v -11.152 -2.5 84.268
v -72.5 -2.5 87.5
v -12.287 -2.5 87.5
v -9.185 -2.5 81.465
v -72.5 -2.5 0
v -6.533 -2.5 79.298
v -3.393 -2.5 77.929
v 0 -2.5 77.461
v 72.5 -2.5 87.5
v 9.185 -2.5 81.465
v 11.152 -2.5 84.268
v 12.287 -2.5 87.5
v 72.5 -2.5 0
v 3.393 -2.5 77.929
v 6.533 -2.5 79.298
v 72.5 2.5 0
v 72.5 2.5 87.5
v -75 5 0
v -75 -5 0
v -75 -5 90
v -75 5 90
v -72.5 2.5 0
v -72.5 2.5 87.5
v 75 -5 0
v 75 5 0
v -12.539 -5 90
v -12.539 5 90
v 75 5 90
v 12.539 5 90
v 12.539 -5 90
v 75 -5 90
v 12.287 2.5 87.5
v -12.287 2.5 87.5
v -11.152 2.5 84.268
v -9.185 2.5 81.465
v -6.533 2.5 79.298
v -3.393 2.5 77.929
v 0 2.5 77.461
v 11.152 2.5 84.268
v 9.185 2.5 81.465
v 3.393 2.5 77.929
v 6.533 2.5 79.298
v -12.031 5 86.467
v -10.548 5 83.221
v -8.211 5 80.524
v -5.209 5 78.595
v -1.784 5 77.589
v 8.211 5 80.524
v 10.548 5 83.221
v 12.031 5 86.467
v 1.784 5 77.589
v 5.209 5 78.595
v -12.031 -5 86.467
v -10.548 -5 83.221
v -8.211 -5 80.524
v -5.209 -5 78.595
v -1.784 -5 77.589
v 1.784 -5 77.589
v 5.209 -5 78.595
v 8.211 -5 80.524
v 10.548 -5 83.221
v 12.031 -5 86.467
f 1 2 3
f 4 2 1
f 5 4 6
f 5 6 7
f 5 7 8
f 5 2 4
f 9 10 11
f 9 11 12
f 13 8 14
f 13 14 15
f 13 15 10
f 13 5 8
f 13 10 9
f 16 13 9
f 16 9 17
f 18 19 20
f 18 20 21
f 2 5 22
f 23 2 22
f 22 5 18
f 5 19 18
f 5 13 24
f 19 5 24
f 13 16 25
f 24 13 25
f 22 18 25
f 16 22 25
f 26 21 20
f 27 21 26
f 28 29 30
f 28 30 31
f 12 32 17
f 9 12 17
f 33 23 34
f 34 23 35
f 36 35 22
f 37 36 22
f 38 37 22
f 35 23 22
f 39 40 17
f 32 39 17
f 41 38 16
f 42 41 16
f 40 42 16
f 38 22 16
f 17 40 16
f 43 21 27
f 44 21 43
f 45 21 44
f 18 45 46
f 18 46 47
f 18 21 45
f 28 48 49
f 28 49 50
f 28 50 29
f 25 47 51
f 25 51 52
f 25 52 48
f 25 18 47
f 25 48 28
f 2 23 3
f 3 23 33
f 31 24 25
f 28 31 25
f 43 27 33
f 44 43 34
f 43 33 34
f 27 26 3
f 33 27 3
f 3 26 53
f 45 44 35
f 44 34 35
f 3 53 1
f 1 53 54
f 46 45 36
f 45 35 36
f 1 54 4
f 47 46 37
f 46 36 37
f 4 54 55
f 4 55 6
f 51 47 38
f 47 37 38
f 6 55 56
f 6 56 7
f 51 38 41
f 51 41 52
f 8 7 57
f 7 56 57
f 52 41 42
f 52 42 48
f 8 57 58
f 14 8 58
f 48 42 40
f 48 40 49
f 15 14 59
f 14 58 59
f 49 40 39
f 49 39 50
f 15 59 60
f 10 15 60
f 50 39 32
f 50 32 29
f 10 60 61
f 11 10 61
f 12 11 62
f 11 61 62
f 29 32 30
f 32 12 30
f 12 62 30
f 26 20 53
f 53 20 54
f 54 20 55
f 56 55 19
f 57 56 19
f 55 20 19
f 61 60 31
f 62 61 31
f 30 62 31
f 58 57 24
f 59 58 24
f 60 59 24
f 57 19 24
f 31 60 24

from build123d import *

# Parameters (mm, degrees)
F0_W     = 150
F0_H     = 10
F1_DEPTH = 90
F2_T     = -2.5
F3_R     = 12.538546
F4_DEPTH = 25


with BuildPart() as f1:
    # F0 (on Top) → F1 (new body)
    with BuildSketch(Plane.XY):
        Rectangle(F0_W, F0_H)
    extrude(amount=F1_DEPTH)

    # F2
    f2_openings = [f1.faces().sort_by_distance(p)[0] for p in [
        (0, 0, 0),
    ]]
    offset(amount=F2_T, openings=f2_openings)

    # F3 (on face) → F4 (cut)
    with BuildSketch(Plane.XZ.offset(5)):
        with Locations((0, 90)):
            Circle(F3_R)
    extrude(amount=-F4_DEPTH, mode=Mode.SUBTRACT)


solid = f1.part
